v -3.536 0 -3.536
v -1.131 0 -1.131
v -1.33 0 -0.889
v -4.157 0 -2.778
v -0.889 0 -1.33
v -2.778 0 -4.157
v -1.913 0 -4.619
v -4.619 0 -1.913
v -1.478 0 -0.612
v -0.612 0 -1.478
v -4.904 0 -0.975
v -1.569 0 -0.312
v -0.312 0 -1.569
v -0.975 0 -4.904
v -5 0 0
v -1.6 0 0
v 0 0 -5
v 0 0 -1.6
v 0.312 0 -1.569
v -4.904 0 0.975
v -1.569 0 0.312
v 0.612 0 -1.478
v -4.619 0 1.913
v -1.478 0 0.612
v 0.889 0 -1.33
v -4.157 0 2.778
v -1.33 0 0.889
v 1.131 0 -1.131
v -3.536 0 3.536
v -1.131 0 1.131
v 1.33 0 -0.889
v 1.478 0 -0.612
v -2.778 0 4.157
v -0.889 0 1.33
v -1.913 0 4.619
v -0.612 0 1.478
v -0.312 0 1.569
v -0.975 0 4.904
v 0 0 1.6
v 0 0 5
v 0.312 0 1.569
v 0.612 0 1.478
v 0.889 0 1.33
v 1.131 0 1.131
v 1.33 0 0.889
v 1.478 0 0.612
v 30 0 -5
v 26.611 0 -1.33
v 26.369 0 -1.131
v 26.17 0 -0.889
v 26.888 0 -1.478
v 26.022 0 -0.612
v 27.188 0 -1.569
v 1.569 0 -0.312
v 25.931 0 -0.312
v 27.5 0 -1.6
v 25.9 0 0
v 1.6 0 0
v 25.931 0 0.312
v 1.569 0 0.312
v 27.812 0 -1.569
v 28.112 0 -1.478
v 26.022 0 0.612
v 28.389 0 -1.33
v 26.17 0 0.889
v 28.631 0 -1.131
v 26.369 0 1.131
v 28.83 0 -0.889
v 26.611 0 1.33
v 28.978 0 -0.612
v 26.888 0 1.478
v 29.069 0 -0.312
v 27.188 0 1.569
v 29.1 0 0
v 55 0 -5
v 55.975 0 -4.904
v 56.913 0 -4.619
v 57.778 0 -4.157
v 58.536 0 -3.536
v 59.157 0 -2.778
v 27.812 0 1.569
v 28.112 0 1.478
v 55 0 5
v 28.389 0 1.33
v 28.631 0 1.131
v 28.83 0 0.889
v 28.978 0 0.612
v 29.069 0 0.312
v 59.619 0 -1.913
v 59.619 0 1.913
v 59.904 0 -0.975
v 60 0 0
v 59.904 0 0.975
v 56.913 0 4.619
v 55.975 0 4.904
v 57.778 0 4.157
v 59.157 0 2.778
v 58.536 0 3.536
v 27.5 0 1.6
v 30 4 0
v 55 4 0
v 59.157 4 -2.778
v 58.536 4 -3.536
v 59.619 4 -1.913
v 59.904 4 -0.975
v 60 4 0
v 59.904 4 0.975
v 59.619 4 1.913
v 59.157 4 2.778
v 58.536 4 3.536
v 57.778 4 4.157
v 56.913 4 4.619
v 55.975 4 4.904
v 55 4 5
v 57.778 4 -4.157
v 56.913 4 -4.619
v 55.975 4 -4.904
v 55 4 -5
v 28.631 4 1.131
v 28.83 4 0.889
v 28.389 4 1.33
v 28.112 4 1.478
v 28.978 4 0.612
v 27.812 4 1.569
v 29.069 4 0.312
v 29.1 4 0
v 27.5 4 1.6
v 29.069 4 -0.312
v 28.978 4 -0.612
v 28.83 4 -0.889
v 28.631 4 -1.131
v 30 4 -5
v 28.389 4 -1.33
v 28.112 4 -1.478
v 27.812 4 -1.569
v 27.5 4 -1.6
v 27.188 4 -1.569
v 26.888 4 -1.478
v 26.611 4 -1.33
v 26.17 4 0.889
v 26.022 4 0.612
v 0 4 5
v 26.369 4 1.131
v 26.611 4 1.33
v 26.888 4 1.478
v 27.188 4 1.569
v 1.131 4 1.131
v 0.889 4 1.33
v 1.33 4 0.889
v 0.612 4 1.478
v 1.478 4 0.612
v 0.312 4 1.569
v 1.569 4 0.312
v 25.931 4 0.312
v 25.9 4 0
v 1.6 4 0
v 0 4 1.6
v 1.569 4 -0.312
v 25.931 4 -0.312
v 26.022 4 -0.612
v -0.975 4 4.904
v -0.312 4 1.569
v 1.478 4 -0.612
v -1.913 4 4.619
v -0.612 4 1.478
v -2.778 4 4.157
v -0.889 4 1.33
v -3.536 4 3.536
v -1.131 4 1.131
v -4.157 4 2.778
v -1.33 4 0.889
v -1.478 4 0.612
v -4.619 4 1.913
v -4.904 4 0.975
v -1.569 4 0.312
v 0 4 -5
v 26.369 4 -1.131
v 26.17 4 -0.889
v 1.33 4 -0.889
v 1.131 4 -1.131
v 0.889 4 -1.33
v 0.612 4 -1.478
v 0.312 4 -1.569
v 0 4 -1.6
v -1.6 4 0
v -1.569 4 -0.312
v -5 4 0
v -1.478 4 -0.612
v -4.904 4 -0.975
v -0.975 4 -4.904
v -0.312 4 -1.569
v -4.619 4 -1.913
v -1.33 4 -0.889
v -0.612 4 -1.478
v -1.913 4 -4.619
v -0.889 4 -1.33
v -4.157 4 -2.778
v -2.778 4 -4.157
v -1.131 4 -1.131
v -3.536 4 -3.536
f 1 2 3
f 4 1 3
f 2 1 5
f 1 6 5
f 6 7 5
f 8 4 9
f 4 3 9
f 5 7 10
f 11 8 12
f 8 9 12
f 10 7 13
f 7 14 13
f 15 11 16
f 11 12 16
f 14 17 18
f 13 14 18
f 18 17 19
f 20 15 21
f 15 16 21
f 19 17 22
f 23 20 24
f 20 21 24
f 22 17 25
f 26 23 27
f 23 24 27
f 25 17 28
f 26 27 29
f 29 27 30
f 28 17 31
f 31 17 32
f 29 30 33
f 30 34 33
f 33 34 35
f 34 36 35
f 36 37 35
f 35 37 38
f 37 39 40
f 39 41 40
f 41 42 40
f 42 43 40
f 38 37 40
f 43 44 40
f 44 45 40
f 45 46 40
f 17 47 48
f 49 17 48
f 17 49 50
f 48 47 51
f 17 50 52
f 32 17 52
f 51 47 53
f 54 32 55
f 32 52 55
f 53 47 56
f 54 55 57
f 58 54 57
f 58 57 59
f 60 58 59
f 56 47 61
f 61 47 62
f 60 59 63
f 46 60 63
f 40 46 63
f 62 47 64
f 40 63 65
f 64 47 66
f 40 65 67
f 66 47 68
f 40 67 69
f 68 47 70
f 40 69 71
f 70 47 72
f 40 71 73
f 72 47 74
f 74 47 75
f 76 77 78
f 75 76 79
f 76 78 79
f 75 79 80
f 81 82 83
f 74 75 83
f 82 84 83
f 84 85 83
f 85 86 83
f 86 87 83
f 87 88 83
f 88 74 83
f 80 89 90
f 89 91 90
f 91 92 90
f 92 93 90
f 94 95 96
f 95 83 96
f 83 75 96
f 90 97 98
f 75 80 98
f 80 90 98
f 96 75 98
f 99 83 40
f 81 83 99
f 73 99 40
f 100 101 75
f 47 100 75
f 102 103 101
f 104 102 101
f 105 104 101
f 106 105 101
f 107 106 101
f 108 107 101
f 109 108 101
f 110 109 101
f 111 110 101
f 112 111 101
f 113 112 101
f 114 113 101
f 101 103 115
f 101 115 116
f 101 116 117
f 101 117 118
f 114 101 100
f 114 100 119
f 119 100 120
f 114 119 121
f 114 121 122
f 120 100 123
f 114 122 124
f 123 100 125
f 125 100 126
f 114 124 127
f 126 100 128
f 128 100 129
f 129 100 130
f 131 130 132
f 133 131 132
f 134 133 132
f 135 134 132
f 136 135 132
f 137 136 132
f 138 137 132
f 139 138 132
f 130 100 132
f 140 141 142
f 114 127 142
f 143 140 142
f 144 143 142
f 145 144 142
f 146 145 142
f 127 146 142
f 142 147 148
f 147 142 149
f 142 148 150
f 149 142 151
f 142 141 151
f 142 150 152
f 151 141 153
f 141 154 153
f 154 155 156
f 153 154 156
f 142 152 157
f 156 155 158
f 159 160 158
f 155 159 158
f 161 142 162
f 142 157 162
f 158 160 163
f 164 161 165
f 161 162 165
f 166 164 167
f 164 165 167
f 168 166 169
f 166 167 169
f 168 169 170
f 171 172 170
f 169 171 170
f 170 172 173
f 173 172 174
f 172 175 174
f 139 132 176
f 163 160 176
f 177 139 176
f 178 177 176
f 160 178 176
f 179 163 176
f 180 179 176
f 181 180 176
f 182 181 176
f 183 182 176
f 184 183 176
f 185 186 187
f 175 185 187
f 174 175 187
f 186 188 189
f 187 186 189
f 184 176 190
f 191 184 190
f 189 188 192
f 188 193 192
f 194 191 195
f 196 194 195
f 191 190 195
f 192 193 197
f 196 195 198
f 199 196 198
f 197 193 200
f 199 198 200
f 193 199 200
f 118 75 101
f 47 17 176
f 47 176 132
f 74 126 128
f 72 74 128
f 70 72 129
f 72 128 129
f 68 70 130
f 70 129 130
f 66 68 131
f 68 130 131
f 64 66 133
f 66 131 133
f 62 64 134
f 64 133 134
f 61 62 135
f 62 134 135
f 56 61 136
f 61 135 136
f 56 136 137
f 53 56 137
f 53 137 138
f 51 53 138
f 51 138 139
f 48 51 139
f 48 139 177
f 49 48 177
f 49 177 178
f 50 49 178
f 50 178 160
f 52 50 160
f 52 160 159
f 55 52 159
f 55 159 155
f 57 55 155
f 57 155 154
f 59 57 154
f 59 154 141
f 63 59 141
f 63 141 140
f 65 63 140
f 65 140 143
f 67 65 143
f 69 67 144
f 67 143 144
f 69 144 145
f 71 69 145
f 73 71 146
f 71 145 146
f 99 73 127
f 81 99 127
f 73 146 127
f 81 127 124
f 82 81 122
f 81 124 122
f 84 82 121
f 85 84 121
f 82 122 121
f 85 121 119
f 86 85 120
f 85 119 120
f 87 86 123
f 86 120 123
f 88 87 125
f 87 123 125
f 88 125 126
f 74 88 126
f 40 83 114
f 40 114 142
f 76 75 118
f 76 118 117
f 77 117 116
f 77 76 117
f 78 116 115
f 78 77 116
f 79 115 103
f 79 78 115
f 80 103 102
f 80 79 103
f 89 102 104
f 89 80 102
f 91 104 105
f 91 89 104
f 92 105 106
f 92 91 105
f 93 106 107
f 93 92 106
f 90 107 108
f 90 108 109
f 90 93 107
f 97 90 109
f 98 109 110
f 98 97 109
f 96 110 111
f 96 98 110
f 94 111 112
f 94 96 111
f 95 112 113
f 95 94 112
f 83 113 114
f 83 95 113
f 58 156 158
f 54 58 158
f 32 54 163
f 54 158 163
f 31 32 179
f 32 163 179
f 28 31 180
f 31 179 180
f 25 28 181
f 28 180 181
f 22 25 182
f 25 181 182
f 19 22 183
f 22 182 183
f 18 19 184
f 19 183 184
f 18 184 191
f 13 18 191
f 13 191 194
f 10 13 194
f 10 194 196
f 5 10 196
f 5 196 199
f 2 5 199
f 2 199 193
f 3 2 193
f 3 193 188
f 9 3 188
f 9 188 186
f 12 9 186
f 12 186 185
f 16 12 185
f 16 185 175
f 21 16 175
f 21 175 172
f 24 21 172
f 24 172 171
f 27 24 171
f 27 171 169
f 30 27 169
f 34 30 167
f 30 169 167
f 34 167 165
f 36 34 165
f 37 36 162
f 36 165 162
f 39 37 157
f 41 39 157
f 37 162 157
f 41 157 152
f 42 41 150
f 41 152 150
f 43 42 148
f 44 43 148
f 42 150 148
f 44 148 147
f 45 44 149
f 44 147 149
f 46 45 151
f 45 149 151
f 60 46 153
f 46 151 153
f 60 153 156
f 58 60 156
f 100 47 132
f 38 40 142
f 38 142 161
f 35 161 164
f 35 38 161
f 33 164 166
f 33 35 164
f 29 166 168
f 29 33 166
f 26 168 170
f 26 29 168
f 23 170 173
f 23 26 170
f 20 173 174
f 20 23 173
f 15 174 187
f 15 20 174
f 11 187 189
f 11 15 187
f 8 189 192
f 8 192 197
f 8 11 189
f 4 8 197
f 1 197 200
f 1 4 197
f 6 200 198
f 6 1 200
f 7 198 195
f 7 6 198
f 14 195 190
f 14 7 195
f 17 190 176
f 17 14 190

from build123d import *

# Parameters (mm, degrees)
BOSS_EXTRUDE1_DEPTH = 4
SKETCH2_R           = 1.6
CUT_EXTRUDE1_DEPTH  = 5
SKETCH3_W           = 25
SKETCH3_H           = 4
CUT_EXTRUDE2_DEPTH  = 5
BOSS_EXTRUDE2_DEPTH = 25


with BuildPart() as part:
    # Sketch1 → Boss-Extrude1 (new body)
    with BuildSketch(Plane(origin=(0, 0, 0), x_dir=(1, 0, 0), z_dir=(0, 1, 0))):
        with BuildLine():
            Line((0, 5), (55, 5))
            ThreePointArc((55, 5), (60, 0), (55, -5))
            Line((55, -5), (0, -5))
            ThreePointArc((0, -5), (-5, 0), (0, 5))
        make_face()
    extrude(amount=BOSS_EXTRUDE1_DEPTH)

    # Sketch2 → Cut-Extrude1 (cut, through all)
    with BuildSketch(Plane(origin=(0, 4, 0), x_dir=(1, 0, 0), z_dir=(0, 1, 0))):
        Circle(SKETCH2_R)
        with Locations((27.5, 0)):
            Circle(SKETCH2_R)
    extrude(amount=-CUT_EXTRUDE1_DEPTH, mode=Mode.SUBTRACT)

    # Sketch3 → Cut-Extrude2 (cut)
    with BuildSketch(Plane(origin=(0, 0, -5), x_dir=(-1, 0, 0), z_dir=(0, 0, -1))):
        with Locations((-42.5, 2)):
            Rectangle(SKETCH3_W, SKETCH3_H)
    extrude(amount=-CUT_EXTRUDE2_DEPTH, mode=Mode.SUBTRACT)

    # Sketch4 → Boss-Extrude2 (add)
    with BuildSketch(Plane.ZY.offset(-55)):
        Polygon((0, 4), (-5, 0), (0, 0), align=None)
    extrude(amount=BOSS_EXTRUDE2_DEPTH)


solid = part.part
